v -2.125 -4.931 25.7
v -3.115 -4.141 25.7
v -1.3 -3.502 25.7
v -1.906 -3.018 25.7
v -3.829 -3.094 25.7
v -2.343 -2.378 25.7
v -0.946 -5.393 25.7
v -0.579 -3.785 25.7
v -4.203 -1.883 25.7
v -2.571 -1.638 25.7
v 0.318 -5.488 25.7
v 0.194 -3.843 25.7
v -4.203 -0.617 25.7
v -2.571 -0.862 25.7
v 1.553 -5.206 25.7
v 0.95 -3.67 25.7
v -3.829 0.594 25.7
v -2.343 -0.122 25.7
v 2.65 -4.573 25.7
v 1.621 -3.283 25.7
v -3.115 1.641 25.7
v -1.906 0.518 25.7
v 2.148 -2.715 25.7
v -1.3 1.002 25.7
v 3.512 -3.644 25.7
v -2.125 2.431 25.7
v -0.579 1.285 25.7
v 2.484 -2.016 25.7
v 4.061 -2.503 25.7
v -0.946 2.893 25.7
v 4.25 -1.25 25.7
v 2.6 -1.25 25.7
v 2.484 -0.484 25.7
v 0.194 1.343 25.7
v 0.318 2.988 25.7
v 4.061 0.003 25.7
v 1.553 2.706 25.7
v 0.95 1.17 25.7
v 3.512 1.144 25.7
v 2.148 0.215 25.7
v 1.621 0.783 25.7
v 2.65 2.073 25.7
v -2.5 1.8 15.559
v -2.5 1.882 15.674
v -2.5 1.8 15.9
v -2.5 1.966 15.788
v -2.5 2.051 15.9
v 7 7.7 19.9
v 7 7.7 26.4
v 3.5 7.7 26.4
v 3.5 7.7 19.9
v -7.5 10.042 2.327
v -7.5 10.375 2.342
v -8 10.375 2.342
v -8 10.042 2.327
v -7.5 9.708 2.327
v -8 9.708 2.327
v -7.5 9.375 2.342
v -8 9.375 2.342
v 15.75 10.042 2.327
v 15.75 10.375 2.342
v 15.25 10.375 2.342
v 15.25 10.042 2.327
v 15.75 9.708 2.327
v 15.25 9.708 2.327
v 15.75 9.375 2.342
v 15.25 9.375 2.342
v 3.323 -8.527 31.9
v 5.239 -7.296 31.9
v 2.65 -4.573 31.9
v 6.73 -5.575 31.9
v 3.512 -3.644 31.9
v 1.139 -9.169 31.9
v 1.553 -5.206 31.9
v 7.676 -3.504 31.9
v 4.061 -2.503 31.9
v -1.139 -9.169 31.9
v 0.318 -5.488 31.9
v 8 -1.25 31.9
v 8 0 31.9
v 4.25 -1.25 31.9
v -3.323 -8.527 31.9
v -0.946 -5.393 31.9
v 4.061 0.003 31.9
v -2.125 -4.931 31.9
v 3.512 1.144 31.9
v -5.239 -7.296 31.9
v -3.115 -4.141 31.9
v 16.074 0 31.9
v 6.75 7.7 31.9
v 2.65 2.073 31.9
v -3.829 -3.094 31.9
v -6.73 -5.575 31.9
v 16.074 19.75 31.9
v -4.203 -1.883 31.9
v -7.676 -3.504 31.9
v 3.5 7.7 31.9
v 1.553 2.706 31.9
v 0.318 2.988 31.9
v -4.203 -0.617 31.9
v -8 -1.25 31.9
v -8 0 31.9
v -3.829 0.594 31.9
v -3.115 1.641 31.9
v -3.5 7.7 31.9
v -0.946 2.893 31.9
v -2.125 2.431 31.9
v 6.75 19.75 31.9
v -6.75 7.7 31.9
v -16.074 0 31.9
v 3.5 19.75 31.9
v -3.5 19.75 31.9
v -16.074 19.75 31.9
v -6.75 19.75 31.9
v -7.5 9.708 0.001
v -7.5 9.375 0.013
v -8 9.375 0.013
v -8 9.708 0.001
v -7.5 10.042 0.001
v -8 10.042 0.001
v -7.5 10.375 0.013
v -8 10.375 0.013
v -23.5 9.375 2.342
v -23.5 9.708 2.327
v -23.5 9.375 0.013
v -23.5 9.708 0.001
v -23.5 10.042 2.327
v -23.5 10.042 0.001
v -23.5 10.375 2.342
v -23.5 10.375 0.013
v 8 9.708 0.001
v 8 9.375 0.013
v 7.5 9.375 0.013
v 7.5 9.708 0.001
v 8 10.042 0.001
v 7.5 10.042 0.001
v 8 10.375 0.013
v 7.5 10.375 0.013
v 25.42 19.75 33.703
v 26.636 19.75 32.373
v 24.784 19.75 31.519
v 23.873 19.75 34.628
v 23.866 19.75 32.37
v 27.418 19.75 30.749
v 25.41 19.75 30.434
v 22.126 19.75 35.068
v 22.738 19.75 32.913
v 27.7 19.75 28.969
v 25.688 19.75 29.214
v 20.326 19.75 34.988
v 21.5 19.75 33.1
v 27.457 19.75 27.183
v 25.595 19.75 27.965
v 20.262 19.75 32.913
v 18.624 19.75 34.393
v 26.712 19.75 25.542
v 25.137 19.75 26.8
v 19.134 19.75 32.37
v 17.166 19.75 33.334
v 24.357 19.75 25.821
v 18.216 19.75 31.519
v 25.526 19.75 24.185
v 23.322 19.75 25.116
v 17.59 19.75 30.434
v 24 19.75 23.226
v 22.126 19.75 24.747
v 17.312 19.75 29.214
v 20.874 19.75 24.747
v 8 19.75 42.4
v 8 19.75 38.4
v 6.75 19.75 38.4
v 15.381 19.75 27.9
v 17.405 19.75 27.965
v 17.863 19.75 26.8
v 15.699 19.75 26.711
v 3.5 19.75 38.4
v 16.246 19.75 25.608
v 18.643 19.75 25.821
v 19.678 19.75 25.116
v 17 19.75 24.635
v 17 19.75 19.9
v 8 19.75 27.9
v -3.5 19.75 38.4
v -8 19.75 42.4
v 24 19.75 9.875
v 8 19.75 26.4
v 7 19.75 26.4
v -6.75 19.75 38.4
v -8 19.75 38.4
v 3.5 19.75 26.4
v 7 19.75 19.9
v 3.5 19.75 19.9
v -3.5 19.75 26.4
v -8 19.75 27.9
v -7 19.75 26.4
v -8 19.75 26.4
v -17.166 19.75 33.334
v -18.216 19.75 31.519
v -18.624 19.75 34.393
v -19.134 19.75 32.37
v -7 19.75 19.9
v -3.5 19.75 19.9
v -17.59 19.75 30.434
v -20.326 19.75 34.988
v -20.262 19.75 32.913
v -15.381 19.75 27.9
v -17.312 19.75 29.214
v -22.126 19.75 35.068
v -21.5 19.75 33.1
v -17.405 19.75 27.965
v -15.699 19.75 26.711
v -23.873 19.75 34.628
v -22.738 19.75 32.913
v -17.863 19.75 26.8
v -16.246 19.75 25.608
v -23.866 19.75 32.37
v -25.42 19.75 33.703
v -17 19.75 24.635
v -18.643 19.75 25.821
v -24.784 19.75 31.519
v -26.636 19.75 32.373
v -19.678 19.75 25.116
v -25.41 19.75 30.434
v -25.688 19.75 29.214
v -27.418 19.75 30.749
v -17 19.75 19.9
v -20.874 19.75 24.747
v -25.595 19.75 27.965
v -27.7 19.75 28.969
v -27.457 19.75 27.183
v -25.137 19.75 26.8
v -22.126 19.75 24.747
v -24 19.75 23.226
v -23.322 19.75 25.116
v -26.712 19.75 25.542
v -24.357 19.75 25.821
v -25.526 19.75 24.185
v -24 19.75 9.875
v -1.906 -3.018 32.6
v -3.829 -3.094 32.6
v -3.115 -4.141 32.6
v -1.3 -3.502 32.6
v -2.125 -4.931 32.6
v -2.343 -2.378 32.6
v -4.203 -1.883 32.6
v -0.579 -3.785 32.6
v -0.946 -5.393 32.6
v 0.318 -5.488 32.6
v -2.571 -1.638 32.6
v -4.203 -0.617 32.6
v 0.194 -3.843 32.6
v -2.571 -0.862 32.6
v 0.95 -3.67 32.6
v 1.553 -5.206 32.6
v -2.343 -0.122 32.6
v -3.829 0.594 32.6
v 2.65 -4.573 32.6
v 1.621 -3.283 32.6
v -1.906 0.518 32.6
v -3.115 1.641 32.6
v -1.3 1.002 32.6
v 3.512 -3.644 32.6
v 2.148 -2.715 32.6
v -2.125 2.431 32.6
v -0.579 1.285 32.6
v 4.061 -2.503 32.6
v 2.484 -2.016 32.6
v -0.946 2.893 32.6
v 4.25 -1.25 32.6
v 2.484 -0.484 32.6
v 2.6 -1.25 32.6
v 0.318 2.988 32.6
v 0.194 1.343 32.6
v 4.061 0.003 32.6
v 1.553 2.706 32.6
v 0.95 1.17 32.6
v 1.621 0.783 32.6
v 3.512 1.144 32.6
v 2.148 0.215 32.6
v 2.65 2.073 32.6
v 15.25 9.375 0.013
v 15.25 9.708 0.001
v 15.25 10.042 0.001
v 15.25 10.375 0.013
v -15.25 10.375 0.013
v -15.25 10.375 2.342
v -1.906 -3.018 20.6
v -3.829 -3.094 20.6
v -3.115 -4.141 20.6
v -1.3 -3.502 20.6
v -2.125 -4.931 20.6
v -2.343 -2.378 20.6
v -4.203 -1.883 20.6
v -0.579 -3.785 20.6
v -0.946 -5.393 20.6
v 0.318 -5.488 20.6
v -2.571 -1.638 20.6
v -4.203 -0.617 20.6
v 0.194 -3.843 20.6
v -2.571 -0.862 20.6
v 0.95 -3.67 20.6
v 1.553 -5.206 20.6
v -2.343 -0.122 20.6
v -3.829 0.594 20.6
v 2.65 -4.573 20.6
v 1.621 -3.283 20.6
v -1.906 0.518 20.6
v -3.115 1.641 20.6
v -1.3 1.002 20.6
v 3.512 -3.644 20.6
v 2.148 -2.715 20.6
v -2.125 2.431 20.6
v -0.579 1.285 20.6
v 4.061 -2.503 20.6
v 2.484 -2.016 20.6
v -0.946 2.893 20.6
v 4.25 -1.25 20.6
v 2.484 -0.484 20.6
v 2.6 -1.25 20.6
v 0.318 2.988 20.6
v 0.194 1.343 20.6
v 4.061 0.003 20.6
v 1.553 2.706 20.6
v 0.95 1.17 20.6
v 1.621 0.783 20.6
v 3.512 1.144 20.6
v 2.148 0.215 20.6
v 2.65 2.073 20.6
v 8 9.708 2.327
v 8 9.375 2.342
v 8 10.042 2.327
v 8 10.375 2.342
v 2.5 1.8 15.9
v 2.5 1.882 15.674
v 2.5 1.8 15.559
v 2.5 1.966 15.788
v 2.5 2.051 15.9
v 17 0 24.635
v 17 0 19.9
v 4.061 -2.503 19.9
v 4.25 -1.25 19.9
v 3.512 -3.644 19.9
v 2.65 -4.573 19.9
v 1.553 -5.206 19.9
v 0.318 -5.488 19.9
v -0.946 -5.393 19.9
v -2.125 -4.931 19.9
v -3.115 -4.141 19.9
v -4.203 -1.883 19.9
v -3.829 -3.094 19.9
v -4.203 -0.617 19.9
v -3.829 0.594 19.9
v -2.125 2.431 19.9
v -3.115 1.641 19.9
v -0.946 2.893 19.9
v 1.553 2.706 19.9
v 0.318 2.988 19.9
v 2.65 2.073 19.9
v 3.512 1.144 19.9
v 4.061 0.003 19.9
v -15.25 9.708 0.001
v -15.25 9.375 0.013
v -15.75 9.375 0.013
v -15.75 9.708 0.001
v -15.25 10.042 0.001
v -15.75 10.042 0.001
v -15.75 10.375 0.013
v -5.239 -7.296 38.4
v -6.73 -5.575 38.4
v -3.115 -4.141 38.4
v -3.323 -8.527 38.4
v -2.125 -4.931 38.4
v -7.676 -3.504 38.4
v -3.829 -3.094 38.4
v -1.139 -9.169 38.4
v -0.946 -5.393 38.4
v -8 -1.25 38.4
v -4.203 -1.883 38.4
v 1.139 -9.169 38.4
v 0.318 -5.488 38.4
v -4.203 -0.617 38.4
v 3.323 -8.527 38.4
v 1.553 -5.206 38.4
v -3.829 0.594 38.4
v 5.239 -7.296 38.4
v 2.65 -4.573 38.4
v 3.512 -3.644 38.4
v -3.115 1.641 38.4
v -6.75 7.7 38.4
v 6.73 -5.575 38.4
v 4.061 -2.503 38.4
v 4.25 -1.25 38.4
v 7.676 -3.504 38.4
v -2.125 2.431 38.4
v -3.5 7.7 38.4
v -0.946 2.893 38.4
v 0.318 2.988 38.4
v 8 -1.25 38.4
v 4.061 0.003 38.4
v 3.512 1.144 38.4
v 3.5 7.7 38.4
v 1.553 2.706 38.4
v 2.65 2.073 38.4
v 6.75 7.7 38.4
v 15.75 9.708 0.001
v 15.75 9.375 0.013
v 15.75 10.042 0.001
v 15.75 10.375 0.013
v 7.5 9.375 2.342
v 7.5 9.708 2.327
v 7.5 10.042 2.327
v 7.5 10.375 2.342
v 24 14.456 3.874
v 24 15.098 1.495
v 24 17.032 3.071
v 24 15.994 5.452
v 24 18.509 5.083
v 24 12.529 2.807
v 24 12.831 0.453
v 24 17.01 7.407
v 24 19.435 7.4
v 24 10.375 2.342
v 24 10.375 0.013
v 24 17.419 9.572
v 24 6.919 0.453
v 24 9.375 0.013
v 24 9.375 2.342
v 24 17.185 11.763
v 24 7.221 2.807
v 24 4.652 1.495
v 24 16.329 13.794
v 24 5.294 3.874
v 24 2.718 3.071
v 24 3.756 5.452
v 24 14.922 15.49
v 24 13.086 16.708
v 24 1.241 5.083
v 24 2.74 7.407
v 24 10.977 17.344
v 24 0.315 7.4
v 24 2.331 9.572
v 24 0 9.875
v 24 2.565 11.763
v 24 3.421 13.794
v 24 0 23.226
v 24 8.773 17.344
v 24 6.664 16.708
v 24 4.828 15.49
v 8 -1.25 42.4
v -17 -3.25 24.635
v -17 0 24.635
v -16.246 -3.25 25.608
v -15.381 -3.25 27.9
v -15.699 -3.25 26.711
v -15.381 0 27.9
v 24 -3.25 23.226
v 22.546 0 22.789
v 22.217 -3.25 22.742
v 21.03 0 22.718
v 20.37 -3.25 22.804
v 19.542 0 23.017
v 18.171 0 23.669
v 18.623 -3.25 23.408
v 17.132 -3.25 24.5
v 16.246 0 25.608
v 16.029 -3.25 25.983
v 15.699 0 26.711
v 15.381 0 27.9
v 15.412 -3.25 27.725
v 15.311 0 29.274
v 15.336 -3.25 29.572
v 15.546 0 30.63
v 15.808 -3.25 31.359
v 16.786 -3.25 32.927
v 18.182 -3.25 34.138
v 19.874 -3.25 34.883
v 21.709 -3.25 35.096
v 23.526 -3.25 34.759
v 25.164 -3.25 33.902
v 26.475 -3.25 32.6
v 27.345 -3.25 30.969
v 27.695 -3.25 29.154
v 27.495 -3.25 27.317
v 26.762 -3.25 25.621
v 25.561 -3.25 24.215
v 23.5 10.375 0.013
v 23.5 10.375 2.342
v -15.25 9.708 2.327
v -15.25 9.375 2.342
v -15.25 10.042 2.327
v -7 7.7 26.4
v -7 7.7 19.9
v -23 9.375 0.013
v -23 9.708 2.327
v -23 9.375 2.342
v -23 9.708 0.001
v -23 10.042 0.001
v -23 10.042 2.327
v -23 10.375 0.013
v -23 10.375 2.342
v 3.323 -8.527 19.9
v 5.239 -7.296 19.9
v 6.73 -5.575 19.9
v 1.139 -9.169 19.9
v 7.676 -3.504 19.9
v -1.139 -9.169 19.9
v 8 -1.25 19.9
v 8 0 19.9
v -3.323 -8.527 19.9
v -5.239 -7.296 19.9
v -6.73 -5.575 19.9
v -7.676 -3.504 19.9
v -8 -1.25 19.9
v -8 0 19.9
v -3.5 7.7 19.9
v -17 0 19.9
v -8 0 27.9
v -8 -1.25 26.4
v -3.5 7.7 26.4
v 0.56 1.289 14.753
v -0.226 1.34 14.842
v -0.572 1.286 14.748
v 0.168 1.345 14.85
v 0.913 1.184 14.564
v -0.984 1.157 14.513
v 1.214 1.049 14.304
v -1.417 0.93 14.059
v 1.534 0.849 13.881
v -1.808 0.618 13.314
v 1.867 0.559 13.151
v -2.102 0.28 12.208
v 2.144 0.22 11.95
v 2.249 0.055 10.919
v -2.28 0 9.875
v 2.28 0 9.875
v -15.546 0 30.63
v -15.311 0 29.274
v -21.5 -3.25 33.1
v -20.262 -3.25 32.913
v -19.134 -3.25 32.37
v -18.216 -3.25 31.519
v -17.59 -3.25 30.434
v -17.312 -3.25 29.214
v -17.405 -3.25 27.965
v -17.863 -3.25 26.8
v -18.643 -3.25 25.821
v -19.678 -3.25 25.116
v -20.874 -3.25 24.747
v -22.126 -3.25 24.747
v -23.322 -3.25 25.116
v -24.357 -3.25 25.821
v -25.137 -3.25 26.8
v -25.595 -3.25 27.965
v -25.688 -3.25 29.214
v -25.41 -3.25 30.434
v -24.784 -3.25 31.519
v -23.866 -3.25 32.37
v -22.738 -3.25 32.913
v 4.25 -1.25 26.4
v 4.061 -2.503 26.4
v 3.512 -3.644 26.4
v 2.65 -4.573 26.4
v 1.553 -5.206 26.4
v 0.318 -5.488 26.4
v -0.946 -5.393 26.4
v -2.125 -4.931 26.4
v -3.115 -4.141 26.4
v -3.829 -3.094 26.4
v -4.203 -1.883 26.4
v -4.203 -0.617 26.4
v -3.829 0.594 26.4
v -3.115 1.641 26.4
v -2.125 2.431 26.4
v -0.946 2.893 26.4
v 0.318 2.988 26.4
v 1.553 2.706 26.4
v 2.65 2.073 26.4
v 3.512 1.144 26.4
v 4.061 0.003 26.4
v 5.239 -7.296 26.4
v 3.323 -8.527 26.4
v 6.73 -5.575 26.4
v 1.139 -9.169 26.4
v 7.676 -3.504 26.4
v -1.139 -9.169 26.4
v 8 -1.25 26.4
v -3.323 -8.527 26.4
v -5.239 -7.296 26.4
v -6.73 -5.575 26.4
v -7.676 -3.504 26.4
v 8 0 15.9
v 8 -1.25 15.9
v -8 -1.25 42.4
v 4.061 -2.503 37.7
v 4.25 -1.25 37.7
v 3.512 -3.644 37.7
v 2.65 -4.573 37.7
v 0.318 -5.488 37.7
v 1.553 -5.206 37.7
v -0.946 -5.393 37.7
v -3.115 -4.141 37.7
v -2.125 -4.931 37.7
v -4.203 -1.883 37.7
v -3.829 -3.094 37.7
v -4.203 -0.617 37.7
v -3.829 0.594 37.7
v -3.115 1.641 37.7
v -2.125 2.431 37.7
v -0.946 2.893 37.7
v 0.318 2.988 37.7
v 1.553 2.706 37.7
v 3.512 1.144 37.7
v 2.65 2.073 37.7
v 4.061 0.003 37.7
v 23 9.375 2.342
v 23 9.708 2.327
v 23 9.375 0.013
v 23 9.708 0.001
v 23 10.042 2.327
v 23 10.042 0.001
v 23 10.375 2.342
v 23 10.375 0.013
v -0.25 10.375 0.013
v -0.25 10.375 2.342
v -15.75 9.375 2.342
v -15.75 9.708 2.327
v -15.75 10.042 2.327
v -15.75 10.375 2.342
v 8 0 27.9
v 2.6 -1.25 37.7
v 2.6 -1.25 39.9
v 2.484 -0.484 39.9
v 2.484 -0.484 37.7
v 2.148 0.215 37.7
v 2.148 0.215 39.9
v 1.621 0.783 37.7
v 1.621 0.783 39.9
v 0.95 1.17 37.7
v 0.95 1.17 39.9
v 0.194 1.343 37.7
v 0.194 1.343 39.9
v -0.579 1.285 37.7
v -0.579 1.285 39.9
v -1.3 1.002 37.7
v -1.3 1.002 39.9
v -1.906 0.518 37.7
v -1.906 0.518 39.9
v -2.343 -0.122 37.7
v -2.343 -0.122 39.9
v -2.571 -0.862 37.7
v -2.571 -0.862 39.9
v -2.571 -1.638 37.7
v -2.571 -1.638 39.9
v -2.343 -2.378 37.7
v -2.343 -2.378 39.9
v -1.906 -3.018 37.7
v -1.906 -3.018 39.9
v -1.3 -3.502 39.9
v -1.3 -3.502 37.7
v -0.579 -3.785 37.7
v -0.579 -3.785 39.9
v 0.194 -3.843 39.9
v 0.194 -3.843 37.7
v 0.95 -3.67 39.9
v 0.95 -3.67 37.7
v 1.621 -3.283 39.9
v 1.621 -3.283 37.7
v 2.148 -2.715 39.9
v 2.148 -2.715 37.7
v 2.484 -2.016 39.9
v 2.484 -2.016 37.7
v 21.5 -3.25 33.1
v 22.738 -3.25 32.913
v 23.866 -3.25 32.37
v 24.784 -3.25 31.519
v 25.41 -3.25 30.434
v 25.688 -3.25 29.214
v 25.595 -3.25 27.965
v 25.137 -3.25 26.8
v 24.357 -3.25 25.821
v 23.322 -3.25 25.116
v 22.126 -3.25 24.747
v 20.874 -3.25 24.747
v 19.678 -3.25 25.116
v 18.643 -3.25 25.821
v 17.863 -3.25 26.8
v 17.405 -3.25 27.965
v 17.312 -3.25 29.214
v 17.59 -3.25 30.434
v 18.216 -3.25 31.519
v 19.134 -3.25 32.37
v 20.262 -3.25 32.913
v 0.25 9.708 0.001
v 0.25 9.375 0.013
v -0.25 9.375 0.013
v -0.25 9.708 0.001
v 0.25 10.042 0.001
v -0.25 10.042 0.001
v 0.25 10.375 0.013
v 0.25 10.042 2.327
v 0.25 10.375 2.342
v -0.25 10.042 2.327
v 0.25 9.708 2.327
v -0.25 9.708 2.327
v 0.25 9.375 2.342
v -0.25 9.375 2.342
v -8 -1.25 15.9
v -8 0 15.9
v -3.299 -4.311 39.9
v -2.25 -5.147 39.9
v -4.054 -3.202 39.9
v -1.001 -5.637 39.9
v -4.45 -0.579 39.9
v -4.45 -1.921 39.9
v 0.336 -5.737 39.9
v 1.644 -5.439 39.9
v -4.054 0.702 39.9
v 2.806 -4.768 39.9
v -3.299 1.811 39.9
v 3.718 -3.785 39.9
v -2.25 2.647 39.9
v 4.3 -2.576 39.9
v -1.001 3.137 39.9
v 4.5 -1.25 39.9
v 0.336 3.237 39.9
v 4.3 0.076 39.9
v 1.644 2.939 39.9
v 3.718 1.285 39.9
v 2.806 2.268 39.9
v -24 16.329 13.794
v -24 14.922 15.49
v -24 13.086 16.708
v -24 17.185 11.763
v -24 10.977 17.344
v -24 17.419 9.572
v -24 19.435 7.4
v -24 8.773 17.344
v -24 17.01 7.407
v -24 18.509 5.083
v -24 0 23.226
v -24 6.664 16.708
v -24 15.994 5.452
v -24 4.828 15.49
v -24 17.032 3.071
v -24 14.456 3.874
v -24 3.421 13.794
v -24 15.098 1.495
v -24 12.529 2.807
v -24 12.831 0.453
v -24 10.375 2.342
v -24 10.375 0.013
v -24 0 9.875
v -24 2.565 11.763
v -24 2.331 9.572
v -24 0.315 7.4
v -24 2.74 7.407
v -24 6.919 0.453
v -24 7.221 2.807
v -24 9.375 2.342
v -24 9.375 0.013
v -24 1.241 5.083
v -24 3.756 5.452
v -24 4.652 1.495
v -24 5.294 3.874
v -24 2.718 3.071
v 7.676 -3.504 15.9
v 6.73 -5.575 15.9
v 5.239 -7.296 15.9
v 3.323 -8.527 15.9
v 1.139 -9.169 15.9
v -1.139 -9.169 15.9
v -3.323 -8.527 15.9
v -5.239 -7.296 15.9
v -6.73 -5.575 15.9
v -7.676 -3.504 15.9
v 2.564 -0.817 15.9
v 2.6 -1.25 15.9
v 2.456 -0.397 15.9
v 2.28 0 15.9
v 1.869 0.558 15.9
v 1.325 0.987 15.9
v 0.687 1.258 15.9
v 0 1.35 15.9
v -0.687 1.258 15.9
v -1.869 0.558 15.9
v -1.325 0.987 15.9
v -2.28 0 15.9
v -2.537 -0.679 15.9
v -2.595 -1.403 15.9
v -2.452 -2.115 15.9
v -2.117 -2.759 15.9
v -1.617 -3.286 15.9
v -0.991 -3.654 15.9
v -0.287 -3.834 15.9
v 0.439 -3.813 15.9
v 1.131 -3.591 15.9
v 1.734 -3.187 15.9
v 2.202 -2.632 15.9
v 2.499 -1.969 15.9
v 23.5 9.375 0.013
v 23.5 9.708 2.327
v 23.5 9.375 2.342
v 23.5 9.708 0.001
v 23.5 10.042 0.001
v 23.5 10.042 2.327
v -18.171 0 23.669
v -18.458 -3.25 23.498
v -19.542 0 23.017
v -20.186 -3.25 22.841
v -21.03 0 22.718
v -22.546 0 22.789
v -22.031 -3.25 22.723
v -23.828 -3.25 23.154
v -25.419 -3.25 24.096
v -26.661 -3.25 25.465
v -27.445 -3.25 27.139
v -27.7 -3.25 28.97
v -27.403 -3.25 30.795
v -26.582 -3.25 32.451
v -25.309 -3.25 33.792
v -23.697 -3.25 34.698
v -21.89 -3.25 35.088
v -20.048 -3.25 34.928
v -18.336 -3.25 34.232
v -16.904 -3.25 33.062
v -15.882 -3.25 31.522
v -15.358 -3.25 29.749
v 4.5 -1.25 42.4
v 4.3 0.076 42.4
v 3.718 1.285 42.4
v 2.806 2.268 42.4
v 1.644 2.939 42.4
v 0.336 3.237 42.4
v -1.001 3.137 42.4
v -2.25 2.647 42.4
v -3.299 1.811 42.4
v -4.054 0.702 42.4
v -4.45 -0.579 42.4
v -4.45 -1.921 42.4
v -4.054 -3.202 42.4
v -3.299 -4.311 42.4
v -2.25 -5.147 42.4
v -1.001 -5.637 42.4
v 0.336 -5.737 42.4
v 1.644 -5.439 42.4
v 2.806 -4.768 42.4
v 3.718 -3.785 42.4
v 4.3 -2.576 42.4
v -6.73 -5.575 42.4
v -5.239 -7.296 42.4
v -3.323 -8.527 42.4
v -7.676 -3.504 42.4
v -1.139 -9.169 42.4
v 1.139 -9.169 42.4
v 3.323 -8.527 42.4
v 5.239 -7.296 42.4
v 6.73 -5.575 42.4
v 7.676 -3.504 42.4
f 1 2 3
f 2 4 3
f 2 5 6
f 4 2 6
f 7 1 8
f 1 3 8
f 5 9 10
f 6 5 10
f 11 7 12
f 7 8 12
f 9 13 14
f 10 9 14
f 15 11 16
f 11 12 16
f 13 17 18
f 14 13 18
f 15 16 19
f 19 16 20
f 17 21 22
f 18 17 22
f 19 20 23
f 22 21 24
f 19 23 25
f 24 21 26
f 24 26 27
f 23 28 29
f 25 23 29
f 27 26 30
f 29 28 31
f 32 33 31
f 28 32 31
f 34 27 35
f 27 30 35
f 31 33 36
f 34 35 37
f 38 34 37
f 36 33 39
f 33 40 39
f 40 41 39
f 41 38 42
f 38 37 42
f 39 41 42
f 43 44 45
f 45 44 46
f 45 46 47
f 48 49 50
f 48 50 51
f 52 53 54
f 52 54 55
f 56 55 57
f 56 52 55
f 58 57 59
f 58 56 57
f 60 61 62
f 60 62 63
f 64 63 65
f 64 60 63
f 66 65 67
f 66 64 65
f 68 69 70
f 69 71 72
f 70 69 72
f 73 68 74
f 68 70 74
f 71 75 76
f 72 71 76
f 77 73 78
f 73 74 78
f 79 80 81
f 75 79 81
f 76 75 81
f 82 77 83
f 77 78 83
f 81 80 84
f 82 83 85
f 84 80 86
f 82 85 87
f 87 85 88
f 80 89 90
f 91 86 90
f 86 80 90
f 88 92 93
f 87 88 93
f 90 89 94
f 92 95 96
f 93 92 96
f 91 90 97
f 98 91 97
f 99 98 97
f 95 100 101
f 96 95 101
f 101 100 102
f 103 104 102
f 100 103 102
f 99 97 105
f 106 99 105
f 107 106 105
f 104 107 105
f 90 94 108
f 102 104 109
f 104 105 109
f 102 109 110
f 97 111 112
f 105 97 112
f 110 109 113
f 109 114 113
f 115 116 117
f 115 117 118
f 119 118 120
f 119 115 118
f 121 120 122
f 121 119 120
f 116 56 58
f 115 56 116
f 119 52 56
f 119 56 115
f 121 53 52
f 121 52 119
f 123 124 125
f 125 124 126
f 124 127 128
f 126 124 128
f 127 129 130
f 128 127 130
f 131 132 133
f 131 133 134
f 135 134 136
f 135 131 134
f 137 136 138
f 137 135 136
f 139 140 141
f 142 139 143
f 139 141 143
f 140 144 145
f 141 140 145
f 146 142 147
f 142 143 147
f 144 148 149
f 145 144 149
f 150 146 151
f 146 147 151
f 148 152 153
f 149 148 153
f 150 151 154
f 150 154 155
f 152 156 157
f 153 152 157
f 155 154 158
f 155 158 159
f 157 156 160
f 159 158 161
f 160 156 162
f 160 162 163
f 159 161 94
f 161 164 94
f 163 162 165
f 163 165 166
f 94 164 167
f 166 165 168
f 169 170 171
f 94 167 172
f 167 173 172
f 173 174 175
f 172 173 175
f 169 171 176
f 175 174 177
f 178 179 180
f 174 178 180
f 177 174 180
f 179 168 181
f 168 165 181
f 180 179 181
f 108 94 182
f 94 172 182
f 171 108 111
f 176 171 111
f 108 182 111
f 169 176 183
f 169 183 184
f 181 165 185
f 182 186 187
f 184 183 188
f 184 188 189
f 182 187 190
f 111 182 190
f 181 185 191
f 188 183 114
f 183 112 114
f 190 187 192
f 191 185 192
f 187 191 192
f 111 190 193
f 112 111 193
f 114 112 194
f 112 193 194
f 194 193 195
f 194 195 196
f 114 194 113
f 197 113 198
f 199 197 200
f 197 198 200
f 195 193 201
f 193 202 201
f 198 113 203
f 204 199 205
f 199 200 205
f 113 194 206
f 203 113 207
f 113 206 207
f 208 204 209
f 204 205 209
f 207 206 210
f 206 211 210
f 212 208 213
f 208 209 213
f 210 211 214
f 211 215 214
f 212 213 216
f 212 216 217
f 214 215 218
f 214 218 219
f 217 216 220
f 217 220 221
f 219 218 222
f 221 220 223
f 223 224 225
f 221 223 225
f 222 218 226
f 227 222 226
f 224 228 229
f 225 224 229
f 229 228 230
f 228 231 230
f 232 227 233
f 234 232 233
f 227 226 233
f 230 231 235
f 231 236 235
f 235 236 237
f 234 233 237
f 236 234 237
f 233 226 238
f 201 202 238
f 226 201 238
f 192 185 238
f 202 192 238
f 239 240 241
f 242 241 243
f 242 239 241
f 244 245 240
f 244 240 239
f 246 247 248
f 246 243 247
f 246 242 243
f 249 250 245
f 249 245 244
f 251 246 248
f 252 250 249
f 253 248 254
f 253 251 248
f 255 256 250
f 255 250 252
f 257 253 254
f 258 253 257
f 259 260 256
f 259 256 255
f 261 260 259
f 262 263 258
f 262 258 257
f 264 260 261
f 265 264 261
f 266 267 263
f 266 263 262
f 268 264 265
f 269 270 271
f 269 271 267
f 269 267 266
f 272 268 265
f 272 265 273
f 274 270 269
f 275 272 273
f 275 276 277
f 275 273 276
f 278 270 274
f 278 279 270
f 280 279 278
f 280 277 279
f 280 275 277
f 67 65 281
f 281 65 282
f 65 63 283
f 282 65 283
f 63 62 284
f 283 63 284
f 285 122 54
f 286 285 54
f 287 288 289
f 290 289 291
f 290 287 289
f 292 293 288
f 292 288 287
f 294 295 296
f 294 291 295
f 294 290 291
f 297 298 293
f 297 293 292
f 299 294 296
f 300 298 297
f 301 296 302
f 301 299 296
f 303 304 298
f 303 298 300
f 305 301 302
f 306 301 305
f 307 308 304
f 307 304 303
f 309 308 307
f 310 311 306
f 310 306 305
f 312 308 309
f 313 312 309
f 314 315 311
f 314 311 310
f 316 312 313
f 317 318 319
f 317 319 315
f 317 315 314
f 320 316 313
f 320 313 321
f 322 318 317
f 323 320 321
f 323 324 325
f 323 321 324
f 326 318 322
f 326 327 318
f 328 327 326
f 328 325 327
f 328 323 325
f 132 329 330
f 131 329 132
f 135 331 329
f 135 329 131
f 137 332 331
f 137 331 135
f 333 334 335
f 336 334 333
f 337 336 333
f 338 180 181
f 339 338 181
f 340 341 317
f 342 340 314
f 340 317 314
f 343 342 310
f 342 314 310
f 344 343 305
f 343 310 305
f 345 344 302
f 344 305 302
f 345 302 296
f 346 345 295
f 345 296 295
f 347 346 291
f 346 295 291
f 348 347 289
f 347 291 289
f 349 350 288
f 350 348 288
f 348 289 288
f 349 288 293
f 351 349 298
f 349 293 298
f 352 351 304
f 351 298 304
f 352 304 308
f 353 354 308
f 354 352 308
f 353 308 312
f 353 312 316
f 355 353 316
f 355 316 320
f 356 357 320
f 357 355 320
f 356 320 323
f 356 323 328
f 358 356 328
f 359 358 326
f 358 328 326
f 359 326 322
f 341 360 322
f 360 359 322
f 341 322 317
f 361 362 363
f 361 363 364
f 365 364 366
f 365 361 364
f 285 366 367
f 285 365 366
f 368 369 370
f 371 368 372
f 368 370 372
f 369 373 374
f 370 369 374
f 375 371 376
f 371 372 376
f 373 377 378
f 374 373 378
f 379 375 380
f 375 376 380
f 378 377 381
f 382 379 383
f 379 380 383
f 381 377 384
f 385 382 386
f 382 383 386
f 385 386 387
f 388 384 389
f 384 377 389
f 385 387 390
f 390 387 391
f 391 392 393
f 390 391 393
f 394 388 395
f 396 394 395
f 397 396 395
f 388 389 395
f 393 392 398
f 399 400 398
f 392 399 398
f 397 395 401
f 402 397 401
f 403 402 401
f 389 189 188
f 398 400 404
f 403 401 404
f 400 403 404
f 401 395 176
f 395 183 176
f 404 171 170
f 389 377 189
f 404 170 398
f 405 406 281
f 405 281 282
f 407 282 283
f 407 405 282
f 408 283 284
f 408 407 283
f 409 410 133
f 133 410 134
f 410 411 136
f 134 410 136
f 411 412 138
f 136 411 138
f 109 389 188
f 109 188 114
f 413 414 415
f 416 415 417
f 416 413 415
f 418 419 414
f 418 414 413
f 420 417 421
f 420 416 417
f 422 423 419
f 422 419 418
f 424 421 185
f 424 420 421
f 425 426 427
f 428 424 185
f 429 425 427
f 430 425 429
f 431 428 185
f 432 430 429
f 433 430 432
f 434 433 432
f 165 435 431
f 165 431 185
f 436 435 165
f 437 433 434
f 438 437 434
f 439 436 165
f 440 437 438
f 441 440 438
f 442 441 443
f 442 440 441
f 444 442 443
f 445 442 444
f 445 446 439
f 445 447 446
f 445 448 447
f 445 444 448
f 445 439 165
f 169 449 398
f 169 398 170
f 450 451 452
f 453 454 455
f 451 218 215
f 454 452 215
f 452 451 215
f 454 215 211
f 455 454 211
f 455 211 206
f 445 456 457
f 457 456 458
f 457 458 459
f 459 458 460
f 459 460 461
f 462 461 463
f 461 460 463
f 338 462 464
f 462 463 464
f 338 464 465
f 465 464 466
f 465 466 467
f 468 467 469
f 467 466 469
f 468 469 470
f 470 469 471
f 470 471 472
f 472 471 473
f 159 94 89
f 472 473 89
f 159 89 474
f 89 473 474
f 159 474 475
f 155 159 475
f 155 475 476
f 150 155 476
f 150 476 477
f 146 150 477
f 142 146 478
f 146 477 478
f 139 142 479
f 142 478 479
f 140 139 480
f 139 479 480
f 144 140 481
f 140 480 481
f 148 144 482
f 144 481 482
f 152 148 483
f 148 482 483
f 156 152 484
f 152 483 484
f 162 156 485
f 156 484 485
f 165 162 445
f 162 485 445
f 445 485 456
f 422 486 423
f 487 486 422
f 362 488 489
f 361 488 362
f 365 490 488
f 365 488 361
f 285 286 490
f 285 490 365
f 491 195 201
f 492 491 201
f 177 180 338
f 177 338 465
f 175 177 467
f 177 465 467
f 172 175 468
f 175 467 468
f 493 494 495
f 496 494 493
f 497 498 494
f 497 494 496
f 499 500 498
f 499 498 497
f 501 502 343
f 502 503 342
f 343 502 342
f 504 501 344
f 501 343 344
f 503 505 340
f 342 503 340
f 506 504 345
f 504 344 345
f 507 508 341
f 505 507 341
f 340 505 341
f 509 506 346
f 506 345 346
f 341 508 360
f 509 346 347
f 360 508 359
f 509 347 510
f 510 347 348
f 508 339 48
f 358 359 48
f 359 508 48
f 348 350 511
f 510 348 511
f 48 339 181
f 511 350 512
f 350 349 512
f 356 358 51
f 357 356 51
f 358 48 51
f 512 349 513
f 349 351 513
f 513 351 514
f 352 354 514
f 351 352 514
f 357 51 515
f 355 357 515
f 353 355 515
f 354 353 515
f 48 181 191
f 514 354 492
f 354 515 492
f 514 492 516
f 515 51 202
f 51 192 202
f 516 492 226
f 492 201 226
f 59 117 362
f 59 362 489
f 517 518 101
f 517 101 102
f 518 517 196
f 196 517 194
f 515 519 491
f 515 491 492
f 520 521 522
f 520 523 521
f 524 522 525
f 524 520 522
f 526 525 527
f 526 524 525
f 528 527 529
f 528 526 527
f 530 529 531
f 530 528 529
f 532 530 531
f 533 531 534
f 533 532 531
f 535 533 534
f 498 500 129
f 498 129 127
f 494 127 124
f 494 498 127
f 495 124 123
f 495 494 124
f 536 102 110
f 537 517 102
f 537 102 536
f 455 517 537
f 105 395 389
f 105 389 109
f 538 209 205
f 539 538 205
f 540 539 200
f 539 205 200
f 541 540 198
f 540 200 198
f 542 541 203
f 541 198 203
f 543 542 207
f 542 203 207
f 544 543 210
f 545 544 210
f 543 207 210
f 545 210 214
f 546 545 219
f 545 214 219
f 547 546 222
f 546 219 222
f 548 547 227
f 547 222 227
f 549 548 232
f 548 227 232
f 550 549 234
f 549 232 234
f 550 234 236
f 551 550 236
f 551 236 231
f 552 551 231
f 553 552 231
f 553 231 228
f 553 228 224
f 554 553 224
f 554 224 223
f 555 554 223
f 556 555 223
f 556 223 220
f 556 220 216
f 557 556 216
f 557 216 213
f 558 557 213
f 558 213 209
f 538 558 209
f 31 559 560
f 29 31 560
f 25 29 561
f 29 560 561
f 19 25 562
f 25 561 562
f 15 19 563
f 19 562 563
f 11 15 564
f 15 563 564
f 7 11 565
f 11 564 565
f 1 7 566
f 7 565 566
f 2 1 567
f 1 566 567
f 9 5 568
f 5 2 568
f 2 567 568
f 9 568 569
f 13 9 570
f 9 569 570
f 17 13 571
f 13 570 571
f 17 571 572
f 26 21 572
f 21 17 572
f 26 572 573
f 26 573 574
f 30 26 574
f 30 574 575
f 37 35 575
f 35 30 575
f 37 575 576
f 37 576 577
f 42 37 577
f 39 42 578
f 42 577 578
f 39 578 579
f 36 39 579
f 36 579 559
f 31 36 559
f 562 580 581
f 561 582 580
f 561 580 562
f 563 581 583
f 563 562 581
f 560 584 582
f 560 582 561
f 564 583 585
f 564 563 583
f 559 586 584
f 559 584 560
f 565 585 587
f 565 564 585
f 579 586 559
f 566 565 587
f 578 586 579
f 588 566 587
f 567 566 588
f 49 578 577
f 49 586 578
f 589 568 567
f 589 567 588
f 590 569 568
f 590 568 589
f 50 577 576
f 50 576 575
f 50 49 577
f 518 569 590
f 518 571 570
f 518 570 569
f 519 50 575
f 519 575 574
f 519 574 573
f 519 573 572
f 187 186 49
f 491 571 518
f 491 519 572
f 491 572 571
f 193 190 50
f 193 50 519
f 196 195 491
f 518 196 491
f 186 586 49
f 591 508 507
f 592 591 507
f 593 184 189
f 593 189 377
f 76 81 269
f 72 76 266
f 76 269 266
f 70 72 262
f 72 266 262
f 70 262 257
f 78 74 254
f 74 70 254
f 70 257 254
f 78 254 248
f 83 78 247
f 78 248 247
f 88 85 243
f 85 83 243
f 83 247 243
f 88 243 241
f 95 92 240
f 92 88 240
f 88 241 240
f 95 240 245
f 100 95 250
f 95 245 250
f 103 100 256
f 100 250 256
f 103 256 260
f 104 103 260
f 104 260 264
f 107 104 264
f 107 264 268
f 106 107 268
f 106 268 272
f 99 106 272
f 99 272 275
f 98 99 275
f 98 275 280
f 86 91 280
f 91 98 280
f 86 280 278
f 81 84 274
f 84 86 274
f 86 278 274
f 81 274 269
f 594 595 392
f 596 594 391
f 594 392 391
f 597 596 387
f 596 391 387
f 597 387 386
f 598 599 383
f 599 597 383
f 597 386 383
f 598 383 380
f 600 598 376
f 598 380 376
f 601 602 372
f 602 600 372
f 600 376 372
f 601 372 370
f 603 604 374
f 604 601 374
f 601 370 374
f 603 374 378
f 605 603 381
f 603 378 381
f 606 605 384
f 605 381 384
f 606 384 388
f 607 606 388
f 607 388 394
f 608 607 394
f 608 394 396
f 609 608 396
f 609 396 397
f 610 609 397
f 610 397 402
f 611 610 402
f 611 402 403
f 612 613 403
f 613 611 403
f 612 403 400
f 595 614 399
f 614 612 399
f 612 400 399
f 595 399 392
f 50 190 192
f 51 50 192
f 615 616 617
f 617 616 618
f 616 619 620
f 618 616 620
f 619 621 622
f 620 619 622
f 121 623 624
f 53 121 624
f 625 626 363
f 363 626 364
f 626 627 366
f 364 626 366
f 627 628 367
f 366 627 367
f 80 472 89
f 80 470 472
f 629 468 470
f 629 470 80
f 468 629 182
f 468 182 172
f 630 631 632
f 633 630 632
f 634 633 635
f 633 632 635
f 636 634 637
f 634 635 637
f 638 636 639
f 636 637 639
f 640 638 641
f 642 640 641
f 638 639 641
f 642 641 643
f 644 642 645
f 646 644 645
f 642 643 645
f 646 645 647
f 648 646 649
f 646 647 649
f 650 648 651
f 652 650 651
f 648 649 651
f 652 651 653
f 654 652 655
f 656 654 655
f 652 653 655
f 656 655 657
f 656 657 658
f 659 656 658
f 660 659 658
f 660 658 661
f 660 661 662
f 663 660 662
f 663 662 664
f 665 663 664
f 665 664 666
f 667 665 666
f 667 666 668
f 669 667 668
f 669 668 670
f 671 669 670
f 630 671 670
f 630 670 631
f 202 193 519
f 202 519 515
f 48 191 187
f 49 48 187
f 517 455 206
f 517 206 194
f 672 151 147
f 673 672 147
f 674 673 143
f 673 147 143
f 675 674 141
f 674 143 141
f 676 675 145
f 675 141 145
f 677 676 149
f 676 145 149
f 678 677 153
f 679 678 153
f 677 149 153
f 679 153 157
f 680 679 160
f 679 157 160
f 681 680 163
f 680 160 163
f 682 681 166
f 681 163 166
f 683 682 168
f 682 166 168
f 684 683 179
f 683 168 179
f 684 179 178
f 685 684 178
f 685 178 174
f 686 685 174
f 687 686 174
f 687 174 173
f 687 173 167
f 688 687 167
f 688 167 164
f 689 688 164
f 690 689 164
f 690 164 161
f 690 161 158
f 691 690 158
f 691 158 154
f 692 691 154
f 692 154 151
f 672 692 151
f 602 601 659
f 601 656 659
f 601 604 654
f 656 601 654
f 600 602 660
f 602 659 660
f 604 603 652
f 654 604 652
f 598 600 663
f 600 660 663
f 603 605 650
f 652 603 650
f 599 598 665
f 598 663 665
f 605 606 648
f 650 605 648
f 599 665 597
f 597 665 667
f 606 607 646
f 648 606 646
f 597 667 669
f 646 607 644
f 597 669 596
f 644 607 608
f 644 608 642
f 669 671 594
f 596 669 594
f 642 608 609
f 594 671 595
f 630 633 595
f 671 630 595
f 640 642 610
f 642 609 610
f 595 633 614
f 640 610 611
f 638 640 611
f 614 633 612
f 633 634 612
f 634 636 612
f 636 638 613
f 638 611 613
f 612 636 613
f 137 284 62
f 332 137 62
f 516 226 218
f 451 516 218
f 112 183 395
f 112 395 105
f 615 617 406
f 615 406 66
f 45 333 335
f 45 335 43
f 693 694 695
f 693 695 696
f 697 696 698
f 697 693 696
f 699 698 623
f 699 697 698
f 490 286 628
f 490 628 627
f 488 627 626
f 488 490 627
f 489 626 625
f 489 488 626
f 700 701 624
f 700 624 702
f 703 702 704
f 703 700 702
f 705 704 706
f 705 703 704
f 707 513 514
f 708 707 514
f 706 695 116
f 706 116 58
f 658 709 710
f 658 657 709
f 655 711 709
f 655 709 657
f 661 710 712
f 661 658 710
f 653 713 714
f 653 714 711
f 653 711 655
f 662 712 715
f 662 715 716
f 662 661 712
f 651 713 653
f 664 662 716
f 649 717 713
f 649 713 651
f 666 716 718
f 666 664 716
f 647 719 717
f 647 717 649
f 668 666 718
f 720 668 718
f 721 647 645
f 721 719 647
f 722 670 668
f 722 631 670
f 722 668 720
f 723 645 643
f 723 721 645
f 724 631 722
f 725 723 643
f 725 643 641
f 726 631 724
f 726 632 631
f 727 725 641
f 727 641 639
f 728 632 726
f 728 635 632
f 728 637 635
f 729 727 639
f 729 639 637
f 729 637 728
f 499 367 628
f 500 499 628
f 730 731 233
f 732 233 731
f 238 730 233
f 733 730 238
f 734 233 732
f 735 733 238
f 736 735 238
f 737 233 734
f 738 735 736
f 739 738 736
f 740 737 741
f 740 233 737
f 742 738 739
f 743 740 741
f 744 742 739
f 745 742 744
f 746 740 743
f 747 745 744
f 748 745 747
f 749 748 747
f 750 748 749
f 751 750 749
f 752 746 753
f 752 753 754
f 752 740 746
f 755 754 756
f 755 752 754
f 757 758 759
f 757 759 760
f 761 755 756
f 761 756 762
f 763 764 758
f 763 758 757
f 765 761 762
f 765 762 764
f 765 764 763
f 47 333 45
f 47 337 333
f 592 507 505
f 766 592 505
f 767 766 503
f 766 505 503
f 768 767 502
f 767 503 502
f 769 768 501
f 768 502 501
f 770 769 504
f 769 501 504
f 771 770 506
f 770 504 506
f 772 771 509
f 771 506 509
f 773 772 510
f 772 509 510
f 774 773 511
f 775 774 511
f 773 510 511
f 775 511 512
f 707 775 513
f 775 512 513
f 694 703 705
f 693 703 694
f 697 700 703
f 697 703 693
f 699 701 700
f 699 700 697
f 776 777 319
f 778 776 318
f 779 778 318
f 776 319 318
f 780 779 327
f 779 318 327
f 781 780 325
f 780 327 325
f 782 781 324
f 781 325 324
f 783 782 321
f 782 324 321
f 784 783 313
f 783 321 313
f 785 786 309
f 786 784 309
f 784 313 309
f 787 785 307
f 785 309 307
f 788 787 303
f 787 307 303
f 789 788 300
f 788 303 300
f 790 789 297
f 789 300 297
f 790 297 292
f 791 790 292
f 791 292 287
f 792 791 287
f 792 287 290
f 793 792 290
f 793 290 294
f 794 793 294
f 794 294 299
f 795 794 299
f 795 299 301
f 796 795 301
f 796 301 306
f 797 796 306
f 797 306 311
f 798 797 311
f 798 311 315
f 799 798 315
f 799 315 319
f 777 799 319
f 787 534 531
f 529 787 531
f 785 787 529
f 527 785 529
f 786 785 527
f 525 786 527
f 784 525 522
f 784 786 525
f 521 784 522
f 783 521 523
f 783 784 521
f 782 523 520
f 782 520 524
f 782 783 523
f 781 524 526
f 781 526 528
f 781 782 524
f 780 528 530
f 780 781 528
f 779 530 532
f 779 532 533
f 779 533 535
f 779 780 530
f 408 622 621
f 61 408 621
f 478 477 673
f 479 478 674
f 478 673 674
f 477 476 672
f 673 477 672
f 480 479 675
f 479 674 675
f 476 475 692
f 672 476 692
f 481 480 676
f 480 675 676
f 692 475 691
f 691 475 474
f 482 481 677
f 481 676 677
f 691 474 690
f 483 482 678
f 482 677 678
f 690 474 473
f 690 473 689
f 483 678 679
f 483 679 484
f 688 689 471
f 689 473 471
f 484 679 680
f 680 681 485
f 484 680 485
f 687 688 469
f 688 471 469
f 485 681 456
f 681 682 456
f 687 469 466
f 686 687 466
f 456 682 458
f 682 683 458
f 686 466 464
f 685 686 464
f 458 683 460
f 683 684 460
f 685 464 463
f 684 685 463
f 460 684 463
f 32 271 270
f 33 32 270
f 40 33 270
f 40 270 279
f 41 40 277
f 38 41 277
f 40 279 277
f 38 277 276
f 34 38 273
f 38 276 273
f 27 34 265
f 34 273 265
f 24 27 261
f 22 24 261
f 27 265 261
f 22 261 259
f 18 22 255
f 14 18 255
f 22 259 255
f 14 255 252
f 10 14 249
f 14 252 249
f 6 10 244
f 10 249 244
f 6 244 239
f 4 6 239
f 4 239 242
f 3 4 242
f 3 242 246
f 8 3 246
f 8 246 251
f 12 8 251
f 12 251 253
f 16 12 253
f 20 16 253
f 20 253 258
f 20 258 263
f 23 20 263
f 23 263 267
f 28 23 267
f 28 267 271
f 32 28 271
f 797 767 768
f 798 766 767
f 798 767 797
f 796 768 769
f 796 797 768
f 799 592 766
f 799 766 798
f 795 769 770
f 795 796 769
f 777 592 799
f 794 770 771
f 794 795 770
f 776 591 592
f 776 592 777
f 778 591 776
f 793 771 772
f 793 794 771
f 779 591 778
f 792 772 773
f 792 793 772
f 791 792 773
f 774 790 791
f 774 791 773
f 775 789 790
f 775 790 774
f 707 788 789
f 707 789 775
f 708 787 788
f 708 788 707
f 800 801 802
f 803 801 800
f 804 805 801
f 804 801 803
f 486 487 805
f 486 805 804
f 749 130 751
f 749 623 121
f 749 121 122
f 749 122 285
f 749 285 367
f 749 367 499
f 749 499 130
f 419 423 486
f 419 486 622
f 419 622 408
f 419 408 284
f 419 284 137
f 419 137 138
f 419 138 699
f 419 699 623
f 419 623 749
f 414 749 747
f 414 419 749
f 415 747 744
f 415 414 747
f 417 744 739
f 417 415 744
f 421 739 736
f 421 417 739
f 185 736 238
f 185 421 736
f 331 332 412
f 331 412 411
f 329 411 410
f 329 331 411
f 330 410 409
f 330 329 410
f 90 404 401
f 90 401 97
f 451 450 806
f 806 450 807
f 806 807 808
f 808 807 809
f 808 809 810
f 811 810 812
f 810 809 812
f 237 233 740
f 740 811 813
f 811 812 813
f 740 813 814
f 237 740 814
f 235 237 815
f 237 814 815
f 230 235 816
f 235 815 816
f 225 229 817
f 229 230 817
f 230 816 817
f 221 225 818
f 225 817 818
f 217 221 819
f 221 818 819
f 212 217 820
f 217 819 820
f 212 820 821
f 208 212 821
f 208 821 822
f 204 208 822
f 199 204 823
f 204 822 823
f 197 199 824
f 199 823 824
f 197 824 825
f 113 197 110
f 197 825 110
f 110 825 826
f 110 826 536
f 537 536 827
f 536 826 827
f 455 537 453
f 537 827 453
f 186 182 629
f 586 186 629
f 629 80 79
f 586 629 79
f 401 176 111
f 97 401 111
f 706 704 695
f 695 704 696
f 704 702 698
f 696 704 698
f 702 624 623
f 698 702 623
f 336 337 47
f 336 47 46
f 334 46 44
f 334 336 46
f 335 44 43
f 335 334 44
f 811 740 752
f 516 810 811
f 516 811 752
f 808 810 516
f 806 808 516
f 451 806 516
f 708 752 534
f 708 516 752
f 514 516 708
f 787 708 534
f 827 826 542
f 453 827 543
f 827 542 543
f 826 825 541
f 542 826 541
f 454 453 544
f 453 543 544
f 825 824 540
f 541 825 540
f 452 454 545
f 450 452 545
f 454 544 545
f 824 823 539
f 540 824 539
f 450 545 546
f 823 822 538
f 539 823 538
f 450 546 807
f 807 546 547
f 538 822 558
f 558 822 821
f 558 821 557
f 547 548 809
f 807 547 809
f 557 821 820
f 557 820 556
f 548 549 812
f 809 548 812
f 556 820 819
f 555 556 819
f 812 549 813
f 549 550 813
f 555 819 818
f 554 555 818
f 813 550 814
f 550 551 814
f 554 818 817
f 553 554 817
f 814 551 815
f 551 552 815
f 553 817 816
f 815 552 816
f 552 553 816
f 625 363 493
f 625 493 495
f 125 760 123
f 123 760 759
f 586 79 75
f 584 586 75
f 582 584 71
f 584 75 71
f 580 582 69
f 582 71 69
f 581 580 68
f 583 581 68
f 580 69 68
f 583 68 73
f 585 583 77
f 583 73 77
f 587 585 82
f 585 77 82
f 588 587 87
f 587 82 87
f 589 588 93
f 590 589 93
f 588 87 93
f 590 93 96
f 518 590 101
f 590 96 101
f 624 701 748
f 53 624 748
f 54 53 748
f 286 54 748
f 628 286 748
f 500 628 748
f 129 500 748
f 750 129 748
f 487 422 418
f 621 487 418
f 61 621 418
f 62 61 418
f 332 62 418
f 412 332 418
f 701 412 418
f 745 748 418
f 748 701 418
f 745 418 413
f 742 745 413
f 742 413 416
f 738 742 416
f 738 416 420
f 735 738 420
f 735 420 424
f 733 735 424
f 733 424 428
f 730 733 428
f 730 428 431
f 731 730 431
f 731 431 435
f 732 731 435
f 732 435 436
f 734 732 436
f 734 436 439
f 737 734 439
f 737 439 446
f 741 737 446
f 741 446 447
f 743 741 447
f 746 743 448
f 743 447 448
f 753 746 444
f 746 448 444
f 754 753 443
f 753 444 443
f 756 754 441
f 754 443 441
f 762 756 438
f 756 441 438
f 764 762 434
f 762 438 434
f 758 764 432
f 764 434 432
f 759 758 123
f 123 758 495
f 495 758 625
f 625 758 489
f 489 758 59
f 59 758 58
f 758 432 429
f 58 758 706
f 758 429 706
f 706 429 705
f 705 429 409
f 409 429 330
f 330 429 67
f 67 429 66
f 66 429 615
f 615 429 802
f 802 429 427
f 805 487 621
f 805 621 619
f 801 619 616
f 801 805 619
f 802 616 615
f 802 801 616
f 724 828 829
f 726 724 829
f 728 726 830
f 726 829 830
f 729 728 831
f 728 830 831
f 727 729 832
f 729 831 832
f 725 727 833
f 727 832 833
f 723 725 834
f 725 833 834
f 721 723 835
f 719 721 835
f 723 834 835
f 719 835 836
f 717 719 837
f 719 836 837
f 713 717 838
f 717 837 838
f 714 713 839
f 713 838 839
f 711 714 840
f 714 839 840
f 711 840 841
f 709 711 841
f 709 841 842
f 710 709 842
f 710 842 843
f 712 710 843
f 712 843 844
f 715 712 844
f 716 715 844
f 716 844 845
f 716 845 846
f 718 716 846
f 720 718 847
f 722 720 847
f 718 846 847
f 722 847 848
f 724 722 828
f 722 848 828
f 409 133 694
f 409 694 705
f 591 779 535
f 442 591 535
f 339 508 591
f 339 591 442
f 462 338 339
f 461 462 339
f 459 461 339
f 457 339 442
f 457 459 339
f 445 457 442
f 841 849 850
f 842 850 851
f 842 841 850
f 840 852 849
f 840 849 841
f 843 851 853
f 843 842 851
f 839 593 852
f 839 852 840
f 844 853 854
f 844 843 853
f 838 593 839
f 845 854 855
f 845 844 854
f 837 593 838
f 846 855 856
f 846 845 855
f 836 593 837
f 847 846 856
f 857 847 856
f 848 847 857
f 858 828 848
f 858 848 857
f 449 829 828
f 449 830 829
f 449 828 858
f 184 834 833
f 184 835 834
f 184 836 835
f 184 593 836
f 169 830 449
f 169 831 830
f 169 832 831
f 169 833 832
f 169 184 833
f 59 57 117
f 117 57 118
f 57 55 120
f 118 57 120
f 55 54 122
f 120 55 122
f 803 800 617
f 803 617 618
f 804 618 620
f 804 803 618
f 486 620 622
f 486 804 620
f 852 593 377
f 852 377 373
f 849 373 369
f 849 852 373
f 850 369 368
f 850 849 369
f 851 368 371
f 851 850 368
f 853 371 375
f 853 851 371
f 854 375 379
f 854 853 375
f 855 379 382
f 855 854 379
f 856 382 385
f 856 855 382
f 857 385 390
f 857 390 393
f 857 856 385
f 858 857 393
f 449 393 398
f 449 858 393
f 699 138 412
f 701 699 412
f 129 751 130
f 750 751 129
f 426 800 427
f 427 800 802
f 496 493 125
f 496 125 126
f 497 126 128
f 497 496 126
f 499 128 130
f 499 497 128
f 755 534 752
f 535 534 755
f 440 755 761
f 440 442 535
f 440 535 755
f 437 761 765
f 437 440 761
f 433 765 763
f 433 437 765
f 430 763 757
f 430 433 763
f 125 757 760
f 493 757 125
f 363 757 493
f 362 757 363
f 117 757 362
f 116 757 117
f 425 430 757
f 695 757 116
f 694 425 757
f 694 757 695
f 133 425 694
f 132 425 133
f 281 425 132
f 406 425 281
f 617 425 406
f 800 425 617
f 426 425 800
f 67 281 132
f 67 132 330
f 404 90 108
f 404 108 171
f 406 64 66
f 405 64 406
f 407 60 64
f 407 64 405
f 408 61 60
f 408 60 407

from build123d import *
from build123d.topology import SkipClean

# Parameters (mm, degrees)
BOSS_EXTRUDE1_DEPTH      = 19.75
FILLET1_RADIUS           = 9.875
FILLET1_LENGTH           = 48
SKETCH2_R                = 7.55
CUT_EXTRUDE1_DEPTH       = 70.718810231
BOSS_EXTRUDE2_START      = -23
SKETCH3_R                = 6.2
BOSS_EXTRUDE2_DEPTH      = 23
SKETCH4_R                = 4.2
CUT_EXTRUDE2_DEPTH       = 56.624185387
SKETCH5_W                = 7
SKETCH5_H                = 6.5
CUT_EXTRUDE3_DEPTH       = 56.624185387
BOSS_EXTRUDE3_DEPTH      = 4
CUT_EXTRUDE4_REACH       = 60.092
SKETCH7_W                = 6.5
SKETCH7_H                = 7.7
BOSS_EXTRUDE4_DEPTH      = 5.5
SKETCH9_W                = 6.5
SKETCH9_H                = 7.7
CUT_EXTRUDE5_DEPTH       = 14
BOSS_EXTRUDE5_DEPTH      = 4
BOSS_EXTRUDE6_REACH      = 53.302
SKETCH11_R               = 4.25
CUT_EXTRUDE7_DEPTH       = 55.36094646
CUT_EXTRUDE7_DEPTH_BACK  = 5
SKETCH13_W               = 8.5
SKETCH13_H               = 5.1
CUT_EXTRUDE8_DEPTH       = 2.5
CUT_EXTRUDE6_REACH       = 56.361
SKETCH12_R               = 2.6
BOSS_EXTRUDE7_REACH      = 45.123
BOSS_EXTRUDE7_END_RADIUS = 9.875
SKETCH17_W               = 2.341574484
SKETCH17_H               = 1
CUT_EXTRUDE9_DEPTH       = 70.718810231
BOSS_EXTRUDE8_START      = -1
BOSS_EXTRUDE8_DEPTH      = 0.5
LPATTERN1_COUNT          = 7
LPATTERN1_PITCH          = 7.75
SKETCH19_R               = 4.5
CUT_EXTRUDE10_DEPTH      = 2.5


with BuildPart() as part:
    # Sketch1 → Boss-Extrude1 (new body)
    with BuildSketch(Plane(origin=(0, 0, 0), x_dir=(1, 0, 0), z_dir=(0, 1, 0))):
        with BuildLine():
            Line((16.074136013, -31.9), (6.75, -31.9))
            Line((6.75, -31.9), (6.75, -38.4))
            Line((6.75, -38.4), (8, -38.4))
            Line((8, -38.4), (8, -42.4))
            Line((8, -42.4), (-8, -42.4))
            Line((-8, -42.4), (-8, -38.4))
            Line((-8, -38.4), (-6.75, -38.4))
            Line((-6.75, -38.4), (-6.75, -31.9))
            Line((-6.75, -31.9), (-16.074136013, -31.9))
            ThreePointArc((-16.074136013, -31.9), (-26.076909961, -33.082331313), (-24, -23.226376819))
            Line((-24, -23.226376819), (-24, 0))
            Line((-24, 0), (24, 0))
            Line((24, 0), (24, -23.226376819))
            ThreePointArc((24, -23.226376819), (26.076909961, -33.082331313), (16.074136013, -31.9))
        make_face()
    extrude(amount=BOSS_EXTRUDE1_DEPTH)

    # Fillet1: full round fillet: the end face becomes a half cylinder, R = half its width
    fillet1_face = Plane((0, 9.875, 0), x_dir=(1, 0, 0), z_dir=(0, 0, -1))  # on the end face: x along it, z out of the body
    fillet1_slab = fillet1_face.offset(-FILLET1_RADIUS / 2) * Box(FILLET1_LENGTH, 2 * FILLET1_RADIUS, FILLET1_RADIUS, mode=Mode.PRIVATE)  # the body's end, R deep
    fillet1_round = Plane((0, 9.875, 9.875), x_dir=(0, 0, -1), z_dir=(1, 0, 0)) * Cylinder(FILLET1_RADIUS, FILLET1_LENGTH, mode=Mode.PRIVATE)  # its axis R under the face
    add(fillet1_slab - fillet1_round, mode=Mode.SUBTRACT)

    # Sketch2 → Cut-Extrude1 (cut, through all)
    with BuildSketch(Plane(origin=(24, 0, 0), x_dir=(0, 0, -1), z_dir=(1, 0, 0))):
        with Locations((-9.875, 9.875)):
            Circle(SKETCH2_R)
    extrude(amount=-CUT_EXTRUDE1_DEPTH, mode=Mode.SUBTRACT)

    # Sketch3 → Boss-Extrude2 (add)
    with SkipClean():  # the faces are left unmerged after this step: merging them gives an invalid solid
        with BuildSketch(Plane(origin=(0, 19.75, 0), x_dir=(1, 0, 0), z_dir=(0, 1, 0)).offset(BOSS_EXTRUDE2_START)):
            with Locations(Location((21.5, -28.9, 0), (0, 0, 66.220005269))):
                Circle(SKETCH3_R)
            with Locations(Location((-21.5, -28.9, 0), (0, 0, 113.779994731))):
                Circle(SKETCH3_R)
        extrude(amount=BOSS_EXTRUDE2_DEPTH)

    # Sketch4 → Cut-Extrude2 (cut, through all)
    with SkipClean():  # the faces are left unmerged after this step: merging them gives an invalid solid
        with BuildSketch(Plane(origin=(0, 19.75, 0), x_dir=(1, 0, 0), z_dir=(0, 1, 0))):
            with Locations(Location((-21.5, -28.9, 0), (0, 0, 270))):
                Circle(SKETCH4_R)
            with Locations(Location((21.5, -28.9, 0), (0, 0, 270))):
                Circle(SKETCH4_R)
        extrude(amount=-CUT_EXTRUDE2_DEPTH, mode=Mode.SUBTRACT)

    # Sketch5 → Cut-Extrude3 (cut, through all)
    with BuildSketch(Plane(origin=(0, 19.75, 0), x_dir=(1, 0, 0), z_dir=(0, 1, 0))):
        with Locations((0, -23.15)):
            Rectangle(SKETCH5_W, SKETCH5_H)
        with Locations((0, -35.15)):
            Rectangle(SKETCH5_W, SKETCH5_H)
        with BuildLine():
            Line((17, -19.9), (7, -19.9))
            Line((7, -19.9), (7, -26.4))
            Line((7, -26.4), (8, -26.4))
            Line((8, -26.4), (8, -27.9))
            Line((8, -27.9), (15.381176584, -27.9))
            ThreePointArc((15.381176584, -27.9), (15.945284357, -26.145887779), (17, -24.635026378))
            Line((17, -24.635026378), (17, -19.9))
        make_face()
        with BuildLine():
            Line((-7, -19.9), (-17, -19.9))
            Line((-17, -19.9), (-17, -24.635026378))
            ThreePointArc((-17, -24.635026378), (-15.945284357, -26.145887779), (-15.381176584, -27.9))
            Line((-15.381176584, -27.9), (-8, -27.9))
            Line((-8, -27.9), (-8, -26.4))
            Line((-8, -26.4), (-7, -26.4))
            Line((-7, -26.4), (-7, -19.9))
        make_face()
    extrude(amount=-CUT_EXTRUDE3_DEPTH, mode=Mode.SUBTRACT)

    # Sketch6 → Boss-Extrude3 (add)
    with BuildSketch(Plane.XY.offset(42.4)):
        with BuildLine():
            Line((-8, 0), (-8, -1.25))
            ThreePointArc((-8, -1.25), (0, -9.25), (8, -1.25))
            Line((8, -1.25), (8, 0))
            Line((8, 0), (-8, 0))
        make_face()
    extrude(amount=-BOSS_EXTRUDE3_DEPTH)

    # Cut-Extrude4: up to this face of the body (flat: up to its plane)
    cut_extrude4_end = Plane(part.part.faces().sort_by_distance((-6.75, 9.875, 35.15))[0])
    # Sketch7 → Cut-Extrude4 (cut, up to the picked face)
    with BuildSketch(Plane(origin=(6.75, 0, 0), x_dir=(0, 0, -1), z_dir=(1, 0, 0)), mode=Mode.PRIVATE) as cut_extrude4_sk1:
        with Locations((-35.15, 3.85)):
            Rectangle(SKETCH7_W, SKETCH7_H)
    cut_extrude4_tool1 = split(extrude(cut_extrude4_sk1.sketch, amount=-CUT_EXTRUDE4_REACH, mode=Mode.PRIVATE), bisect_by=cut_extrude4_end, keep=Keep.BOTH, mode=Mode.PRIVATE)
    add(cut_extrude4_tool1.solids().sort_by(Axis((6.75, 3.85, 35.15), (-1, 0, 0)))[0], mode=Mode.SUBTRACT)

    # Sketch8 → Boss-Extrude4 (add)
    with BuildSketch(Plane.XY.offset(31.9)):
        with BuildLine():
            Line((-8, -1.25), (-8, 0))
            Line((-8, 0), (8, 0))
            Line((8, 0), (8, -1.25))
            ThreePointArc((8, -1.25), (0, -9.25), (-8, -1.25))
        make_face()
    extrude(amount=-BOSS_EXTRUDE4_DEPTH)

    # Sketch9 → Cut-Extrude5 (cut)
    with BuildSketch(Plane(origin=(7, 0, 0), x_dir=(0, 0, -1), z_dir=(1, 0, 0))):
        with Locations((-23.15, 3.85)):
            Rectangle(SKETCH9_W, SKETCH9_H)
    extrude(amount=-CUT_EXTRUDE5_DEPTH, mode=Mode.SUBTRACT)

    # Sketch10 → Boss-Extrude5 (add)
    with BuildSketch(Plane.XY.offset(19.9)):
        with BuildLine():
            Line((-8, -1.25), (-8, 0))
            Line((-8, 0), (8, 0))
            Line((8, 0), (8, -1.25))
            ThreePointArc((8, -1.25), (0, -9.25), (-8, -1.25))
        make_face()
    extrude(amount=-BOSS_EXTRUDE5_DEPTH)

    # Boss-Extrude6: up to this face of the body (flat: up to its plane)
    boss_extrude6_end = Plane(part.part.faces().sort_by_distance((0, 13.725, 19.9))[0])
    # Sketch11 → Boss-Extrude6 (add, up to the picked face)
    with BuildSketch(Plane(origin=(0, 0, 38.4), x_dir=(-1, 0, 0), z_dir=(0, 0, -1)), mode=Mode.PRIVATE) as boss_extrude6_sk1:
        with Locations(Location((0, -1.25, 0), (0, 0, 180))):
            Circle(SKETCH11_R)
    boss_extrude6_tool1 = split(extrude(boss_extrude6_sk1.sketch, amount=BOSS_EXTRUDE6_REACH, mode=Mode.PRIVATE), bisect_by=boss_extrude6_end, keep=Keep.BOTH, mode=Mode.PRIVATE)
    add(boss_extrude6_tool1.solids().sort_by(Axis((0, -1.25, 38.4), (0, 0, -1)))[0])

    # Sketch13 → Cut-Extrude7 (cut, two sides: drawn at the far end of the back side and taken through both)
    with BuildSketch(Plane.XZ.offset(-CUT_EXTRUDE7_DEPTH_BACK)):
        with Locations((0, 35.15)):
            Rectangle(SKETCH13_W, SKETCH13_H)
        with Locations((0, 23.15)):
            Rectangle(SKETCH13_W, SKETCH13_H)
    extrude(amount=CUT_EXTRUDE7_DEPTH + CUT_EXTRUDE7_DEPTH_BACK, mode=Mode.SUBTRACT)

    # Sketch15 → Cut-Extrude8 (cut, symmetric)
    with BuildSketch(Plane(origin=(0, 0, 0), x_dir=(0, 0, -1), z_dir=(1, 0, 0))):
        with BuildLine():
            Line((-15.9, 0), (-15.9, 2.050998466))
            ThreePointArc((-15.9, 2.050998466), (-13.05726412, 0.526801239), (-9.875, 0))
            Line((-9.875, 0), (-15.9, 0))
        make_face()
    extrude(amount=CUT_EXTRUDE8_DEPTH, both=True, mode=Mode.SUBTRACT)

    # Cut-Extrude6: up to this face of the body (flat: up to its plane)
    cut_extrude6_end = Plane(part.part.faces().sort_by_distance((0, -3.978206263, 15.9))[0])
    # Sketch12 → Cut-Extrude6 (cut, up to the picked face)
    with BuildSketch(Plane.XY.offset(42.4), mode=Mode.PRIVATE) as cut_extrude6_sk1:
        with Locations((0, -1.25)):
            Circle(SKETCH12_R)
    cut_extrude6_tool1 = split(extrude(cut_extrude6_sk1.sketch, amount=-CUT_EXTRUDE6_REACH, mode=Mode.PRIVATE), bisect_by=cut_extrude6_end, keep=Keep.BOTH, mode=Mode.PRIVATE)
    add(cut_extrude6_tool1.solids().sort_by(Axis((0, -1.25, 42.4), (0, 0, -1)))[0], mode=Mode.SUBTRACT)

    # Boss-Extrude7: up to this cylinder (the profile starts outside it)
    boss_extrude7_end = Plane(origin=(2.389901, 9.875, 9.875), z_dir=(1, 0, 0)) * Cylinder(BOSS_EXTRUDE7_END_RADIUS, 110.996, mode=Mode.PRIVATE)
    # Sketch16 → Boss-Extrude7 (add, up to the surface)
    with BuildSketch(Plane(origin=(0, 0, 15.9), x_dir=(-1, 0, 0), z_dir=(0, 0, -1)), mode=Mode.PRIVATE) as boss_extrude7_sk1:
        with BuildLine():
            Line((-2.279802623, 0), (-2.5, 0))
            Line((-2.5, 0), (-2.5, 1.800187721))
            Line((-2.5, 1.800187721), (2.5, 1.800187721))
            Line((2.5, 1.800187721), (2.5, 0))
            Line((2.5, 0), (2.279802623, 0))
            ThreePointArc((2.279802623, 0), (0, 1.35), (-2.279802623, 0))
        make_face()
    boss_extrude7_tool1 = extrude(boss_extrude7_sk1.sketch, amount=BOSS_EXTRUDE7_REACH, mode=Mode.PRIVATE) - boss_extrude7_end
    add(boss_extrude7_tool1.solids().sort_by_distance((2.389901, 0.053142, 15.9))[0])

    # Sketch17 → Cut-Extrude9 (cut, through all)
    with BuildSketch(Plane.ZY.offset(24)):
        with Locations((1.170787242, 9.875)):
            Rectangle(SKETCH17_W, SKETCH17_H)
    extrude(amount=-CUT_EXTRUDE9_DEPTH, mode=Mode.SUBTRACT)

    # Sketch18 → Boss-Extrude8 (add)
    with BuildSketch(Plane.ZY.offset(24).offset(BOSS_EXTRUDE8_START)):
        with BuildLine():
            Line((0.012666351, 10.375), (2.341574484, 10.375))
            ThreePointArc((2.341574484, 10.375), (2.325, 9.875), (2.341574484, 9.375))
            Line((2.341574484, 9.375), (0.012666351, 9.375))
            ThreePointArc((0.012666351, 9.375), (0, 9.875), (0.012666351, 10.375))
        make_face()
    boss_extrude8 = extrude(amount=BOSS_EXTRUDE8_DEPTH)

    # LPattern1: Boss-Extrude8 ×7
    with Locations(*[(i * LPATTERN1_PITCH, 0, 0) for i in range(1, LPATTERN1_COUNT)]):
        add(boss_extrude8)

    # Sketch19 → Cut-Extrude10 (cut)
    with BuildSketch(Plane.XY.offset(42.4)):
        with Locations((0, -1.25)):
            Circle(SKETCH19_R)
    extrude(amount=-CUT_EXTRUDE10_DEPTH, mode=Mode.SUBTRACT)


solid = part.part
